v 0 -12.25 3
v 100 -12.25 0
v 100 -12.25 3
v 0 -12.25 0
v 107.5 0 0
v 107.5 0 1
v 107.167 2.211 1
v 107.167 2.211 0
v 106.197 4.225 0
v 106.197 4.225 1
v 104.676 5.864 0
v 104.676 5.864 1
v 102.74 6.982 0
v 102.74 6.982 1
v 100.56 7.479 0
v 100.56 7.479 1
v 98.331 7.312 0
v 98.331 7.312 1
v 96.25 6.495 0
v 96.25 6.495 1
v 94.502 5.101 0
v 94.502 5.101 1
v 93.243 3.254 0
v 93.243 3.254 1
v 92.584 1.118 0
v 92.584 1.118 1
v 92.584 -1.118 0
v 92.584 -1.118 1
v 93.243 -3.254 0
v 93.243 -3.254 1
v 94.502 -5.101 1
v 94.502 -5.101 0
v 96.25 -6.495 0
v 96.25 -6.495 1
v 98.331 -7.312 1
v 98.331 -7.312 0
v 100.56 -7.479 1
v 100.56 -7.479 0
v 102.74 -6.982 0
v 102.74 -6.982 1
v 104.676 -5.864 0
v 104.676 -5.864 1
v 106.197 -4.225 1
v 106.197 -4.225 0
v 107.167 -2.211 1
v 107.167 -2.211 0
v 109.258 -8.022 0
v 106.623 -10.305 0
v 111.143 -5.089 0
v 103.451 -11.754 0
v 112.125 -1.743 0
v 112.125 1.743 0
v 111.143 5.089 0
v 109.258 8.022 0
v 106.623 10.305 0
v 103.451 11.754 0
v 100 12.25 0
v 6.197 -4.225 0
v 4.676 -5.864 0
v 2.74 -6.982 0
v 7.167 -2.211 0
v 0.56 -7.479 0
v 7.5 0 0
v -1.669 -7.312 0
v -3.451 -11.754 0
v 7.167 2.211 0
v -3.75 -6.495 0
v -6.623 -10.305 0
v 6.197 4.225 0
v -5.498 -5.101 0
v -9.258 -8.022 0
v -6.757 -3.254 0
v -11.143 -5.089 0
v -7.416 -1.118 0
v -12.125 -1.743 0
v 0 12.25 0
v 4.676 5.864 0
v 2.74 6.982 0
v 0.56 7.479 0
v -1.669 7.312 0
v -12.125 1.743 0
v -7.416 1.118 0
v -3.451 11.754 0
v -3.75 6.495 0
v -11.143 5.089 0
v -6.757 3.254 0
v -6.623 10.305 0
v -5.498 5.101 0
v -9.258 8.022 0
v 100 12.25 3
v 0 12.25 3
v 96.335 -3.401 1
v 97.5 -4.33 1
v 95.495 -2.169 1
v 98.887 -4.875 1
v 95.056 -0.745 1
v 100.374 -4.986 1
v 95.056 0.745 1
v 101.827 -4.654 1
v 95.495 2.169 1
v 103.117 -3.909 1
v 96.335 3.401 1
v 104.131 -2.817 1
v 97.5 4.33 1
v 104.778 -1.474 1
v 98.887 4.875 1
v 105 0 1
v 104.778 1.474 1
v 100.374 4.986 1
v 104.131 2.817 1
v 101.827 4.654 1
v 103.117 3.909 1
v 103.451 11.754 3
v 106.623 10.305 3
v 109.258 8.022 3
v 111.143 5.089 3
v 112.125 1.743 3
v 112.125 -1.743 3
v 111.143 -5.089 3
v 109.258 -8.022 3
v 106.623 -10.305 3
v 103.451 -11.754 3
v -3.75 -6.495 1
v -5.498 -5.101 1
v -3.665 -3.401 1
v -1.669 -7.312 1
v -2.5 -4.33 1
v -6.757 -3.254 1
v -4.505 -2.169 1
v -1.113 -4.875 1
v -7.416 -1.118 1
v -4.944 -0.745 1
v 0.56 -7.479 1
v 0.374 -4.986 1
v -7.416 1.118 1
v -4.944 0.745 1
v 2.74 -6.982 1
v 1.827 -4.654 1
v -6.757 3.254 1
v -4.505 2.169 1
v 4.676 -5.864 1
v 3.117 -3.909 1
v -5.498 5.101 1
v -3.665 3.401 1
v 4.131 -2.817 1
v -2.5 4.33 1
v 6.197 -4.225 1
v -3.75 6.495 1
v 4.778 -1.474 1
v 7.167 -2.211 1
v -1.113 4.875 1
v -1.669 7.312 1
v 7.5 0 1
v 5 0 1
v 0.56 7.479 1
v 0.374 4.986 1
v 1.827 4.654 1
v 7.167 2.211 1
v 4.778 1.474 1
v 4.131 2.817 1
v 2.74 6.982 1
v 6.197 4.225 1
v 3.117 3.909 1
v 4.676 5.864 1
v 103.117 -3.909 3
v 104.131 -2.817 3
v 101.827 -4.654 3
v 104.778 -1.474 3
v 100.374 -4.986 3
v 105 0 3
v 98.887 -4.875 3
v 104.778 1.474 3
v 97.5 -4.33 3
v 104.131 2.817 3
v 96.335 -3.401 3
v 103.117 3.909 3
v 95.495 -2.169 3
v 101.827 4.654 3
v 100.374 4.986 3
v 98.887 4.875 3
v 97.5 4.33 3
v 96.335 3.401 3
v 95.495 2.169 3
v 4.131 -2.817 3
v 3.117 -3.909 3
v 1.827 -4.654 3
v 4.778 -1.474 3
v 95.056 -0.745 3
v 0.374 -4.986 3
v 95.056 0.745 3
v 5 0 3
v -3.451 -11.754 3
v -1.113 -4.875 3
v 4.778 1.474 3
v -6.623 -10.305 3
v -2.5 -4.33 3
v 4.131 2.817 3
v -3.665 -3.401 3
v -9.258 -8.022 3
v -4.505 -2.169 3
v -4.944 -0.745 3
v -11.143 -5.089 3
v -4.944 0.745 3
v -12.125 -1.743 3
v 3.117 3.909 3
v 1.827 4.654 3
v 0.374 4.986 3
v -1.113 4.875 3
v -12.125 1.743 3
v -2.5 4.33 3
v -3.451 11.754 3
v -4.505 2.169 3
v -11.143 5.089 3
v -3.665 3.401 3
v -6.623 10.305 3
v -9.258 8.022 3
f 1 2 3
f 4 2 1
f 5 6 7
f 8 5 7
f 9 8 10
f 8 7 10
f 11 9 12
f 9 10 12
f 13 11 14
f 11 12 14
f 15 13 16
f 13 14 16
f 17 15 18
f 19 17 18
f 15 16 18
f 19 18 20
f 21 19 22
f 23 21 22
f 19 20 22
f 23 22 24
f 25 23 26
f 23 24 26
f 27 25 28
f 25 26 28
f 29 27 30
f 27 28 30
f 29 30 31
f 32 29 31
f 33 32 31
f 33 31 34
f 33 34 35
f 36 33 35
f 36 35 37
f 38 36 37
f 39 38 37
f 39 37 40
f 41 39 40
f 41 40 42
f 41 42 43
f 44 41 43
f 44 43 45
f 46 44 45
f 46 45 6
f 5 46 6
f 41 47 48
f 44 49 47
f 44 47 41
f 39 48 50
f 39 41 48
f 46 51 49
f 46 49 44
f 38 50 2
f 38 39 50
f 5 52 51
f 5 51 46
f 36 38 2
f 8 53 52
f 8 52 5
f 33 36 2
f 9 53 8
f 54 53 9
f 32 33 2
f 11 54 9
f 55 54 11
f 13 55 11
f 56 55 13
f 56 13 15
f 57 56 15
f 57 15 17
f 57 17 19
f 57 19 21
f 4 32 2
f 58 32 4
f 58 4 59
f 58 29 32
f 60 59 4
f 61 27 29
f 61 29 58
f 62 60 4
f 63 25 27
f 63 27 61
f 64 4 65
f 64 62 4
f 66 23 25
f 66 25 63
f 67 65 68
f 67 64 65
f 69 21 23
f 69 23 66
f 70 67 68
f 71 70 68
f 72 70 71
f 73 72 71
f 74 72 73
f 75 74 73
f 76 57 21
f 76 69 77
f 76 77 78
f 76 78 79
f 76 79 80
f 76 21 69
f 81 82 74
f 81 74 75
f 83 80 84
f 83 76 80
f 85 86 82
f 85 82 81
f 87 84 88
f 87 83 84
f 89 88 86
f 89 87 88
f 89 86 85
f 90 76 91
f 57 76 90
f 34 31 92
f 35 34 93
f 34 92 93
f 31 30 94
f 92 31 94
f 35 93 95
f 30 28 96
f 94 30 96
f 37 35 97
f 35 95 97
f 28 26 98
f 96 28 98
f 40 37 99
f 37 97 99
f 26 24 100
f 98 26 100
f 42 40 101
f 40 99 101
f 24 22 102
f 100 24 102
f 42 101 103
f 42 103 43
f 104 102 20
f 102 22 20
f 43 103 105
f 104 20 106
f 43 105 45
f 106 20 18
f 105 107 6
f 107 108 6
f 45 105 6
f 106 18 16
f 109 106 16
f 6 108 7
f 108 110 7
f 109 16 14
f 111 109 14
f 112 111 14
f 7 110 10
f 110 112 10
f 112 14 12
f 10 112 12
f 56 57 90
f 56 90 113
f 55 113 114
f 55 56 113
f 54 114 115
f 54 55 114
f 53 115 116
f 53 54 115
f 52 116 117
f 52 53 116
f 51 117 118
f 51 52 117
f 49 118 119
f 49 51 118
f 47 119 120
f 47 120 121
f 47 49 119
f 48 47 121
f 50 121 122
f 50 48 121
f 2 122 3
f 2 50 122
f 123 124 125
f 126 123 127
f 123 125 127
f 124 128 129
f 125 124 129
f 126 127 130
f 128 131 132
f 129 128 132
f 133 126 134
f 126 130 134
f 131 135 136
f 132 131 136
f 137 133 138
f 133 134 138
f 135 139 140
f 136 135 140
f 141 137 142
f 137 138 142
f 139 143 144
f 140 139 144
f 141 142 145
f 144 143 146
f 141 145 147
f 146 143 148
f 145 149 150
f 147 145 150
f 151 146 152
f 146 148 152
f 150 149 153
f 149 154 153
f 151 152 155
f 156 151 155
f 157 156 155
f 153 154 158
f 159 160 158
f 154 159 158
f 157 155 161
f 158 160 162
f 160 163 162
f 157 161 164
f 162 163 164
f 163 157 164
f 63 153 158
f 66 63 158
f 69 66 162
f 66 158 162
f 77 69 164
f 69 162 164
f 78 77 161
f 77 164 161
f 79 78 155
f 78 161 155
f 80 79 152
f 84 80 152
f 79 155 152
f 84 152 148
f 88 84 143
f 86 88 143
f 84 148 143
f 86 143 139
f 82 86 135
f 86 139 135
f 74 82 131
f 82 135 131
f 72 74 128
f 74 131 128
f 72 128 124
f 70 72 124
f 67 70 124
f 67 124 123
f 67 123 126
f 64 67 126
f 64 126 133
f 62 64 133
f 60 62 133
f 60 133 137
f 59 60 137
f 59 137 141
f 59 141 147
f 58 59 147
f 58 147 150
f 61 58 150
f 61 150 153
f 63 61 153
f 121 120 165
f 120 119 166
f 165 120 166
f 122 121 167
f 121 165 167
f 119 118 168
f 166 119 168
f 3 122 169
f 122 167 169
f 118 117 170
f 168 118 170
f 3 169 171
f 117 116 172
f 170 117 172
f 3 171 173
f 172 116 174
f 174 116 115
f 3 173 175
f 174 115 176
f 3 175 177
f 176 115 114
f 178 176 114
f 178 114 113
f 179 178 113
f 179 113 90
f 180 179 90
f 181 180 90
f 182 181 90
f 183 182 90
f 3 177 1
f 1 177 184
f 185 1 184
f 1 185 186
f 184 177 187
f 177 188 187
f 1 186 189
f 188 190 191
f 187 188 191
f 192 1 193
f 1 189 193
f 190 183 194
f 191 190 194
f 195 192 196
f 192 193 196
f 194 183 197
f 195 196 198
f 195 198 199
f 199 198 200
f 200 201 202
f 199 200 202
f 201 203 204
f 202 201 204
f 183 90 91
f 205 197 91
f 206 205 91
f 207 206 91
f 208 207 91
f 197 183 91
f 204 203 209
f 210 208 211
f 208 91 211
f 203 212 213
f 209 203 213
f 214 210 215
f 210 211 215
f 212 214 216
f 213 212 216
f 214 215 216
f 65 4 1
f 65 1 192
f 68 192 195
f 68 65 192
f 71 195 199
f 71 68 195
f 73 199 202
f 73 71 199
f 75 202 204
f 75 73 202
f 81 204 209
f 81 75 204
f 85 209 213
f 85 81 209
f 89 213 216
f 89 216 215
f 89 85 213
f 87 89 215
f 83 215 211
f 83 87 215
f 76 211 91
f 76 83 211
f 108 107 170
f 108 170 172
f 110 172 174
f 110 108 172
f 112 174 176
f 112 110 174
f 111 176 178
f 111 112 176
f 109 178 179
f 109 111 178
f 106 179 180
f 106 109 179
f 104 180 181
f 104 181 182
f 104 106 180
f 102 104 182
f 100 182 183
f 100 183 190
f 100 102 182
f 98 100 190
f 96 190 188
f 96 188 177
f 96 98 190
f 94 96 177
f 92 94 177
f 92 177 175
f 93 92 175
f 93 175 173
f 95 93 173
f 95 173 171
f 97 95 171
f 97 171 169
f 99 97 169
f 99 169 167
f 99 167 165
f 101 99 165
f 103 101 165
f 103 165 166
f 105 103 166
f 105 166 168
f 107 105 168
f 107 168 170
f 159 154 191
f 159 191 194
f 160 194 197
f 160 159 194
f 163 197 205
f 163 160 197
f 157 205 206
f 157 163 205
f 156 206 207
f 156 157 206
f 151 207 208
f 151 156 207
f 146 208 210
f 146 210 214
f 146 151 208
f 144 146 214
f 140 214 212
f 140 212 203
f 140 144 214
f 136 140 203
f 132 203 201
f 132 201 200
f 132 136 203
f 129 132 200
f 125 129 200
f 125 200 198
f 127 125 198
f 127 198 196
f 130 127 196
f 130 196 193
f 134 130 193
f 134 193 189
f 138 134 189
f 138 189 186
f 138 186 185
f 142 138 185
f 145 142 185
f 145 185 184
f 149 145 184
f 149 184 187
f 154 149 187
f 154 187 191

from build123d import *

# Parameters (mm, degrees)
SKETCH_1_R          = 5
EXTRUDE_1_DEPTH     = 3
SKETCH_4_R          = 7.5
CUT_EXTRUDE_3_DEPTH = 3


with BuildPart() as part:
    # 草图1 → 凸台-拉伸1 (new body)
    with BuildSketch(Plane.XY):
        with BuildLine():
            Line((0, 12.25), (100, 12.25))
            ThreePointArc((100, 12.25), (112.25, 0), (100, -12.25))
            Line((100, -12.25), (0, -12.25))
            ThreePointArc((0, -12.25), (-12.25, 0), (0, 12.25))
        make_face()
        Circle(SKETCH_1_R, mode=Mode.SUBTRACT)
        with Locations((100, 0)):
            Circle(SKETCH_1_R, mode=Mode.SUBTRACT)
    extrude(amount=EXTRUDE_1_DEPTH)

    # 草图4 → 切除-拉伸3 (cut)
    with BuildSketch(Plane.XY.offset(1)):
        Circle(SKETCH_4_R)
        with Locations((100, 0)):
            Circle(SKETCH_4_R)
    extrude(amount=-CUT_EXTRUDE_3_DEPTH, mode=Mode.SUBTRACT)


solid = part.part
